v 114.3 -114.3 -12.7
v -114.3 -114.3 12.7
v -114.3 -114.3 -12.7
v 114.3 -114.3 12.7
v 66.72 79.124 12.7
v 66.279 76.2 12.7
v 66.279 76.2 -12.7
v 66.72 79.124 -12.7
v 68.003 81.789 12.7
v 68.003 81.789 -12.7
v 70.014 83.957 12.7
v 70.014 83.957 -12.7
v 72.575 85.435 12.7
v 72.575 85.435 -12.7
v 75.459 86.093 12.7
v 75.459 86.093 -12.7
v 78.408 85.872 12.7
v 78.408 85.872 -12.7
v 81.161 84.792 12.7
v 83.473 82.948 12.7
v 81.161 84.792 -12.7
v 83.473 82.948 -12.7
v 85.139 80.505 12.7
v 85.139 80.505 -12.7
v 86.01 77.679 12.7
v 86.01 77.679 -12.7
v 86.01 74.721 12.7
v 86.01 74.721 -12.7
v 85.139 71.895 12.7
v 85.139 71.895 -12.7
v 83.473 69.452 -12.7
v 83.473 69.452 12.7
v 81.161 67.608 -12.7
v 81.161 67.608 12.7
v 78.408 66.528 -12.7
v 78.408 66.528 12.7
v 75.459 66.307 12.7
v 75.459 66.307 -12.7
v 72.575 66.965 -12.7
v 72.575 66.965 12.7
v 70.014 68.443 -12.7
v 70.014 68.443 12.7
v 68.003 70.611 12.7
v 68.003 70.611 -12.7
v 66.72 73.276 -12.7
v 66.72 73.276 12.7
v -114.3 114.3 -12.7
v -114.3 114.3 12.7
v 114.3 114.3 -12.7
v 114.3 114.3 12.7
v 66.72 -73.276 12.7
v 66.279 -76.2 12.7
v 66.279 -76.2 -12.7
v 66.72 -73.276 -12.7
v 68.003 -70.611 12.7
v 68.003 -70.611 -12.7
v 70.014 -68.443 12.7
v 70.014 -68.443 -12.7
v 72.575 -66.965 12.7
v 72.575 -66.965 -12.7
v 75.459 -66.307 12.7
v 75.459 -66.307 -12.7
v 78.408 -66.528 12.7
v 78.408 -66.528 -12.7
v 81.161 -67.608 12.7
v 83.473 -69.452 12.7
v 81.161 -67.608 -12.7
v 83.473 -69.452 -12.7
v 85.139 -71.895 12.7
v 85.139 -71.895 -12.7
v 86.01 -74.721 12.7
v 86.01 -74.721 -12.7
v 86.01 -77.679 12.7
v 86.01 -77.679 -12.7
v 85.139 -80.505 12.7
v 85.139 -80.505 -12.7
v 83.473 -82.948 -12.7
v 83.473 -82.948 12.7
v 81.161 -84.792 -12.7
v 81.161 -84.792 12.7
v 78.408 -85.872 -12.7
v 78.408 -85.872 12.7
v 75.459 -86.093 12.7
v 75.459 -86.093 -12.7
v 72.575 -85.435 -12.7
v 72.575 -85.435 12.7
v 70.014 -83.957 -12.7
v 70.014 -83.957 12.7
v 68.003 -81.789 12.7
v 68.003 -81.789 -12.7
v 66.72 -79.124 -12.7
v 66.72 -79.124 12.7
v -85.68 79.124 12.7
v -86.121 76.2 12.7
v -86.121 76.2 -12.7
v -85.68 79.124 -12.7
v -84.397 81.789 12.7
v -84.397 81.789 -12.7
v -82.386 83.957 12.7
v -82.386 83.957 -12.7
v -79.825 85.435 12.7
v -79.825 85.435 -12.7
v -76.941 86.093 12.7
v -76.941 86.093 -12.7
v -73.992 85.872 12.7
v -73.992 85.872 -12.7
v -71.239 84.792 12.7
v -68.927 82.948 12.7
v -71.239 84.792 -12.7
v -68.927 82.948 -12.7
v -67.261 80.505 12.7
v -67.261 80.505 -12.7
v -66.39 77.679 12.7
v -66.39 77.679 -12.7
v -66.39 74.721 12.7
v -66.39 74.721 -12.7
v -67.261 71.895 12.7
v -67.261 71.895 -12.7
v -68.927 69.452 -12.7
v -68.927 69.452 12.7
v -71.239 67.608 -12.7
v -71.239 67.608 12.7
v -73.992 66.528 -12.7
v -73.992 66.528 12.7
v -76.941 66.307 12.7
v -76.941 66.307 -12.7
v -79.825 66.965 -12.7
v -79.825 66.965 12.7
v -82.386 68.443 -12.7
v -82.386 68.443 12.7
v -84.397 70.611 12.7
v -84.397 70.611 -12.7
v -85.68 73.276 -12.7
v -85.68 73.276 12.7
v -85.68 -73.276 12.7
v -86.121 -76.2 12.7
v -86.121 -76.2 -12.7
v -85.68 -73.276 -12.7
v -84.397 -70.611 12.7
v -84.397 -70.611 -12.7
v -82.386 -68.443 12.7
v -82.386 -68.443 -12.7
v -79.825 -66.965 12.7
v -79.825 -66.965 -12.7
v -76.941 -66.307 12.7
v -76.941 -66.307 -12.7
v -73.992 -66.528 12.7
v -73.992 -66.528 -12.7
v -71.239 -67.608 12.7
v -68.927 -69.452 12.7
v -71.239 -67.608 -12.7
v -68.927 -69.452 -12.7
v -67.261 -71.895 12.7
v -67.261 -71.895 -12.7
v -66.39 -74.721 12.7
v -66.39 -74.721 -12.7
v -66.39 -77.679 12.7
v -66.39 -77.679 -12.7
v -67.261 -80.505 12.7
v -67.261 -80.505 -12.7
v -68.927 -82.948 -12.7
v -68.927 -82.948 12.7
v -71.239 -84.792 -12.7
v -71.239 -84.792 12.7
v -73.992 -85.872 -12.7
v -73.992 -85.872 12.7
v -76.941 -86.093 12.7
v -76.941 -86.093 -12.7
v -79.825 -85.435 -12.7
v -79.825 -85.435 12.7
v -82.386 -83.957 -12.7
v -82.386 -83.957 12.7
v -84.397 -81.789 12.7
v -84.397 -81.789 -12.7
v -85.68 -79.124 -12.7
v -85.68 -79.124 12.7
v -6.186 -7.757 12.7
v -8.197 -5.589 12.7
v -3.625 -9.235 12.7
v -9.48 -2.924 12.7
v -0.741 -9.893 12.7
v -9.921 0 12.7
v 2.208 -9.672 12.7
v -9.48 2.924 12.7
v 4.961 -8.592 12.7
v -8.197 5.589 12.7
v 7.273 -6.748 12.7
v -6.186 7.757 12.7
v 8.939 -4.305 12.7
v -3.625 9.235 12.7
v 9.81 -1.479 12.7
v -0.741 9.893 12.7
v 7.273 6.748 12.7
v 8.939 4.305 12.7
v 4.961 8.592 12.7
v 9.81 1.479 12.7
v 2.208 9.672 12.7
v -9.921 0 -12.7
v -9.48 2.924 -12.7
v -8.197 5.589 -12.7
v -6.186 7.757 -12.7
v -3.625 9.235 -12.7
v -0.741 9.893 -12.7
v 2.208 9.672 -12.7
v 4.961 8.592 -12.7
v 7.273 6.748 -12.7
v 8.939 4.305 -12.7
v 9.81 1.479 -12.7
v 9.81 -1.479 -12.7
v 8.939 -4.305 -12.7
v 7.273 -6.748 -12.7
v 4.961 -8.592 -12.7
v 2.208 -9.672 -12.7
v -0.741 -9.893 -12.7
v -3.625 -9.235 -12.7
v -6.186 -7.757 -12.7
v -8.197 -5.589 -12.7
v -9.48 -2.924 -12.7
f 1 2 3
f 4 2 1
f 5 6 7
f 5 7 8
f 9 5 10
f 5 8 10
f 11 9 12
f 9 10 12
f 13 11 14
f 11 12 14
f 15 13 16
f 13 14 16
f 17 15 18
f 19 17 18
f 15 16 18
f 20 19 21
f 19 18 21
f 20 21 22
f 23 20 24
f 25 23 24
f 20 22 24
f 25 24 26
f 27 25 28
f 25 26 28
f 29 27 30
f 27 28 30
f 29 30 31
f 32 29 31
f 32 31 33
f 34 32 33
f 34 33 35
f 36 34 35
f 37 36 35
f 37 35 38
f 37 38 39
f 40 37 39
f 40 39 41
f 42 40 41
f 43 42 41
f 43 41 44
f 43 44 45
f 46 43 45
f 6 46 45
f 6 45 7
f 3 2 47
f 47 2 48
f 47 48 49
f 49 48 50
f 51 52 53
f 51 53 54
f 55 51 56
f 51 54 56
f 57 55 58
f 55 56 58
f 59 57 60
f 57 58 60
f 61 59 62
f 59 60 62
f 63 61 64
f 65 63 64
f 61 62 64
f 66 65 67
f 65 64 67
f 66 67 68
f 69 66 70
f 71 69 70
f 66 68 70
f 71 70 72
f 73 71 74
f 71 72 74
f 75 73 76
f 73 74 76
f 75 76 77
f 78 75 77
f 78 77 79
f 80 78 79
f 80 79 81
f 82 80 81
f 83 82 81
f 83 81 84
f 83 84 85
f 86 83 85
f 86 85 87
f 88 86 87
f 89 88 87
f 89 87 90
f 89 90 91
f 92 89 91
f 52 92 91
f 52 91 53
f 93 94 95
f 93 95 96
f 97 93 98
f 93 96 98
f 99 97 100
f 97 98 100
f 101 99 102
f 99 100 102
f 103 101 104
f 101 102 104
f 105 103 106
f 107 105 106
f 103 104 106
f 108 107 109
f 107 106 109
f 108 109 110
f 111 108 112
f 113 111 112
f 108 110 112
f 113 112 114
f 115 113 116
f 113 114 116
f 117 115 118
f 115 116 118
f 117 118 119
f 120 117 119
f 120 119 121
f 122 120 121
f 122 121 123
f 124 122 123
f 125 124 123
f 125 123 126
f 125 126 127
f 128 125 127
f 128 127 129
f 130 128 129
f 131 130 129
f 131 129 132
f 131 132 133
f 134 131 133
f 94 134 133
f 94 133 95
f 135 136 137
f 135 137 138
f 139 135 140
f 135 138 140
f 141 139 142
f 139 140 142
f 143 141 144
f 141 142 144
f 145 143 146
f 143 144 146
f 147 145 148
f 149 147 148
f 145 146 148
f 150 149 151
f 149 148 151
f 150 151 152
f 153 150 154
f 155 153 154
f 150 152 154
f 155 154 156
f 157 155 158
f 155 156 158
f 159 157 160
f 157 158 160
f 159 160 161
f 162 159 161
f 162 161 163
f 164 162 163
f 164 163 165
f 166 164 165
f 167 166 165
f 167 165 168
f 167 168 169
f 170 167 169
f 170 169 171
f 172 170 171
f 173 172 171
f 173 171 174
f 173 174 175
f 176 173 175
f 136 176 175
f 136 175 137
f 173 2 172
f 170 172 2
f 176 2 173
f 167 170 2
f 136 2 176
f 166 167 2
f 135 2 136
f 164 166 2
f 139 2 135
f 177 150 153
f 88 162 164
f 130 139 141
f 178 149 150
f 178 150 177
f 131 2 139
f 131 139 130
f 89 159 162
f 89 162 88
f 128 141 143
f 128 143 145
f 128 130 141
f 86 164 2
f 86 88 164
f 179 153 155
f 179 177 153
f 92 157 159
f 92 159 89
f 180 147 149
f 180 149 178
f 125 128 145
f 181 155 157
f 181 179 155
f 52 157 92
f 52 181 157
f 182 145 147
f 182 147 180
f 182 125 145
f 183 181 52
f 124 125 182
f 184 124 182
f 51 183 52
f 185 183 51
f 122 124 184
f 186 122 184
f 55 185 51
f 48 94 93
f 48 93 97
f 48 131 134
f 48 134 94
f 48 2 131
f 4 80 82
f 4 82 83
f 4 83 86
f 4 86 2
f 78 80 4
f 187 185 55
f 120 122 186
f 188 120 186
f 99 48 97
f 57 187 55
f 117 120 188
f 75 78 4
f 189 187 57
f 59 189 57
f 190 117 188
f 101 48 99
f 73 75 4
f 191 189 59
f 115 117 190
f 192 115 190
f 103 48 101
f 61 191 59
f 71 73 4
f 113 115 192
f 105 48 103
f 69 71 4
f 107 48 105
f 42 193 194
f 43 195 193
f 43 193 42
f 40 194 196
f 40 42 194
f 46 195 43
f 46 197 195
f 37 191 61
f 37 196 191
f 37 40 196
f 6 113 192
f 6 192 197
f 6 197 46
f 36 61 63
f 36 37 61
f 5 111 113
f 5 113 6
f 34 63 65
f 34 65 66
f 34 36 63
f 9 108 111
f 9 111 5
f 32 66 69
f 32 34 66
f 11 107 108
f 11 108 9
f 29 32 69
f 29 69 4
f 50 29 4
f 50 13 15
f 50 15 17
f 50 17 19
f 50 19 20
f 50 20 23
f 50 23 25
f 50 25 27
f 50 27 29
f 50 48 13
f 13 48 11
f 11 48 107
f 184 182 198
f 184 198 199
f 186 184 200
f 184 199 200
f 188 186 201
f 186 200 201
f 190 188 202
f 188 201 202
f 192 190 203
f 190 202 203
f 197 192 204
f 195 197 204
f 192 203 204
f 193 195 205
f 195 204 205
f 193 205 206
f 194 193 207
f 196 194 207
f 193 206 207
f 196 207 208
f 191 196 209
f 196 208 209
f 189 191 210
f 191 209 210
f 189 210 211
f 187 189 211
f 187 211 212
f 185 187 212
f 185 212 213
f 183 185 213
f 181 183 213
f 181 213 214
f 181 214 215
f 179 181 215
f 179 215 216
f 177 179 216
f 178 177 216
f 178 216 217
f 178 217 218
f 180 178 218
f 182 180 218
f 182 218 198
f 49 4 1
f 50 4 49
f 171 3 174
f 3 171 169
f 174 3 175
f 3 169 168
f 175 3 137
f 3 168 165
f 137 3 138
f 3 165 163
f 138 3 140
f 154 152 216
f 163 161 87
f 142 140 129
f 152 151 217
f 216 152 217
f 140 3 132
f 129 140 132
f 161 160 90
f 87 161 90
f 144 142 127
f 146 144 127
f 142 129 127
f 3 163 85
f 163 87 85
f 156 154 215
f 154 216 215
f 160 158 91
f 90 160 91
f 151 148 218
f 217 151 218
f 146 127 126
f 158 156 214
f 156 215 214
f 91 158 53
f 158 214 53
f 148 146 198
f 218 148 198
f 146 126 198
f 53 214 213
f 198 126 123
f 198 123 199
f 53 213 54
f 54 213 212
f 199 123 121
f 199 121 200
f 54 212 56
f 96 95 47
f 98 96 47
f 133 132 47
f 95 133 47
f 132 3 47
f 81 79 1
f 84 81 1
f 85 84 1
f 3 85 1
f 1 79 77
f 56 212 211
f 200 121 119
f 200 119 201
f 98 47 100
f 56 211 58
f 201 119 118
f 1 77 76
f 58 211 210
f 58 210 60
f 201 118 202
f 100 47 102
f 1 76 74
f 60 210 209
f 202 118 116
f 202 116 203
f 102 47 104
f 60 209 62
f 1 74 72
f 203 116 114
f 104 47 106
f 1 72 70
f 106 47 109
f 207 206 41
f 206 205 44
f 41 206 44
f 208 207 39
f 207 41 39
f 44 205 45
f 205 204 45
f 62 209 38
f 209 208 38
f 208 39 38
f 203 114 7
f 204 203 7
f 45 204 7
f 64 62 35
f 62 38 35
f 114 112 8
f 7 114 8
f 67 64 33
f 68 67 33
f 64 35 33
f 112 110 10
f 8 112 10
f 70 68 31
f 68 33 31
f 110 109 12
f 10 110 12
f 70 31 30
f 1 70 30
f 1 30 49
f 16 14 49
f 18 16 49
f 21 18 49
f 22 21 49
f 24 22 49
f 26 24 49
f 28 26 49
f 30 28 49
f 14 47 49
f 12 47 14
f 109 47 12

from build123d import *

# Parameters (mm, degrees)
F0_W     = 228.6
F0_H     = 228.6
F1_DEPTH = 12.7
F3_D     = 19.84248
F4_D     = 19.84248


with BuildPart() as f1:
    # F0 (on Top) → F1 (new body, symmetric)
    with BuildSketch(Plane.XY):
        Rectangle(F0_W, F0_H)
    extrude(amount=F1_DEPTH, both=True)

    # F3 (through all)
    with Locations(Plane.XY.offset(12.7)):
        with Locations((-76.2, 76.2), (76.2, 76.2), (-76.2, -76.2), (76.2, -76.2)):
            Hole(F3_D / 2)

    # F4 (through all)
    with Locations(Plane.XY.offset(12.7)):
        with Locations((0, 0)):
            Hole(F4_D / 2)


solid = f1.part
